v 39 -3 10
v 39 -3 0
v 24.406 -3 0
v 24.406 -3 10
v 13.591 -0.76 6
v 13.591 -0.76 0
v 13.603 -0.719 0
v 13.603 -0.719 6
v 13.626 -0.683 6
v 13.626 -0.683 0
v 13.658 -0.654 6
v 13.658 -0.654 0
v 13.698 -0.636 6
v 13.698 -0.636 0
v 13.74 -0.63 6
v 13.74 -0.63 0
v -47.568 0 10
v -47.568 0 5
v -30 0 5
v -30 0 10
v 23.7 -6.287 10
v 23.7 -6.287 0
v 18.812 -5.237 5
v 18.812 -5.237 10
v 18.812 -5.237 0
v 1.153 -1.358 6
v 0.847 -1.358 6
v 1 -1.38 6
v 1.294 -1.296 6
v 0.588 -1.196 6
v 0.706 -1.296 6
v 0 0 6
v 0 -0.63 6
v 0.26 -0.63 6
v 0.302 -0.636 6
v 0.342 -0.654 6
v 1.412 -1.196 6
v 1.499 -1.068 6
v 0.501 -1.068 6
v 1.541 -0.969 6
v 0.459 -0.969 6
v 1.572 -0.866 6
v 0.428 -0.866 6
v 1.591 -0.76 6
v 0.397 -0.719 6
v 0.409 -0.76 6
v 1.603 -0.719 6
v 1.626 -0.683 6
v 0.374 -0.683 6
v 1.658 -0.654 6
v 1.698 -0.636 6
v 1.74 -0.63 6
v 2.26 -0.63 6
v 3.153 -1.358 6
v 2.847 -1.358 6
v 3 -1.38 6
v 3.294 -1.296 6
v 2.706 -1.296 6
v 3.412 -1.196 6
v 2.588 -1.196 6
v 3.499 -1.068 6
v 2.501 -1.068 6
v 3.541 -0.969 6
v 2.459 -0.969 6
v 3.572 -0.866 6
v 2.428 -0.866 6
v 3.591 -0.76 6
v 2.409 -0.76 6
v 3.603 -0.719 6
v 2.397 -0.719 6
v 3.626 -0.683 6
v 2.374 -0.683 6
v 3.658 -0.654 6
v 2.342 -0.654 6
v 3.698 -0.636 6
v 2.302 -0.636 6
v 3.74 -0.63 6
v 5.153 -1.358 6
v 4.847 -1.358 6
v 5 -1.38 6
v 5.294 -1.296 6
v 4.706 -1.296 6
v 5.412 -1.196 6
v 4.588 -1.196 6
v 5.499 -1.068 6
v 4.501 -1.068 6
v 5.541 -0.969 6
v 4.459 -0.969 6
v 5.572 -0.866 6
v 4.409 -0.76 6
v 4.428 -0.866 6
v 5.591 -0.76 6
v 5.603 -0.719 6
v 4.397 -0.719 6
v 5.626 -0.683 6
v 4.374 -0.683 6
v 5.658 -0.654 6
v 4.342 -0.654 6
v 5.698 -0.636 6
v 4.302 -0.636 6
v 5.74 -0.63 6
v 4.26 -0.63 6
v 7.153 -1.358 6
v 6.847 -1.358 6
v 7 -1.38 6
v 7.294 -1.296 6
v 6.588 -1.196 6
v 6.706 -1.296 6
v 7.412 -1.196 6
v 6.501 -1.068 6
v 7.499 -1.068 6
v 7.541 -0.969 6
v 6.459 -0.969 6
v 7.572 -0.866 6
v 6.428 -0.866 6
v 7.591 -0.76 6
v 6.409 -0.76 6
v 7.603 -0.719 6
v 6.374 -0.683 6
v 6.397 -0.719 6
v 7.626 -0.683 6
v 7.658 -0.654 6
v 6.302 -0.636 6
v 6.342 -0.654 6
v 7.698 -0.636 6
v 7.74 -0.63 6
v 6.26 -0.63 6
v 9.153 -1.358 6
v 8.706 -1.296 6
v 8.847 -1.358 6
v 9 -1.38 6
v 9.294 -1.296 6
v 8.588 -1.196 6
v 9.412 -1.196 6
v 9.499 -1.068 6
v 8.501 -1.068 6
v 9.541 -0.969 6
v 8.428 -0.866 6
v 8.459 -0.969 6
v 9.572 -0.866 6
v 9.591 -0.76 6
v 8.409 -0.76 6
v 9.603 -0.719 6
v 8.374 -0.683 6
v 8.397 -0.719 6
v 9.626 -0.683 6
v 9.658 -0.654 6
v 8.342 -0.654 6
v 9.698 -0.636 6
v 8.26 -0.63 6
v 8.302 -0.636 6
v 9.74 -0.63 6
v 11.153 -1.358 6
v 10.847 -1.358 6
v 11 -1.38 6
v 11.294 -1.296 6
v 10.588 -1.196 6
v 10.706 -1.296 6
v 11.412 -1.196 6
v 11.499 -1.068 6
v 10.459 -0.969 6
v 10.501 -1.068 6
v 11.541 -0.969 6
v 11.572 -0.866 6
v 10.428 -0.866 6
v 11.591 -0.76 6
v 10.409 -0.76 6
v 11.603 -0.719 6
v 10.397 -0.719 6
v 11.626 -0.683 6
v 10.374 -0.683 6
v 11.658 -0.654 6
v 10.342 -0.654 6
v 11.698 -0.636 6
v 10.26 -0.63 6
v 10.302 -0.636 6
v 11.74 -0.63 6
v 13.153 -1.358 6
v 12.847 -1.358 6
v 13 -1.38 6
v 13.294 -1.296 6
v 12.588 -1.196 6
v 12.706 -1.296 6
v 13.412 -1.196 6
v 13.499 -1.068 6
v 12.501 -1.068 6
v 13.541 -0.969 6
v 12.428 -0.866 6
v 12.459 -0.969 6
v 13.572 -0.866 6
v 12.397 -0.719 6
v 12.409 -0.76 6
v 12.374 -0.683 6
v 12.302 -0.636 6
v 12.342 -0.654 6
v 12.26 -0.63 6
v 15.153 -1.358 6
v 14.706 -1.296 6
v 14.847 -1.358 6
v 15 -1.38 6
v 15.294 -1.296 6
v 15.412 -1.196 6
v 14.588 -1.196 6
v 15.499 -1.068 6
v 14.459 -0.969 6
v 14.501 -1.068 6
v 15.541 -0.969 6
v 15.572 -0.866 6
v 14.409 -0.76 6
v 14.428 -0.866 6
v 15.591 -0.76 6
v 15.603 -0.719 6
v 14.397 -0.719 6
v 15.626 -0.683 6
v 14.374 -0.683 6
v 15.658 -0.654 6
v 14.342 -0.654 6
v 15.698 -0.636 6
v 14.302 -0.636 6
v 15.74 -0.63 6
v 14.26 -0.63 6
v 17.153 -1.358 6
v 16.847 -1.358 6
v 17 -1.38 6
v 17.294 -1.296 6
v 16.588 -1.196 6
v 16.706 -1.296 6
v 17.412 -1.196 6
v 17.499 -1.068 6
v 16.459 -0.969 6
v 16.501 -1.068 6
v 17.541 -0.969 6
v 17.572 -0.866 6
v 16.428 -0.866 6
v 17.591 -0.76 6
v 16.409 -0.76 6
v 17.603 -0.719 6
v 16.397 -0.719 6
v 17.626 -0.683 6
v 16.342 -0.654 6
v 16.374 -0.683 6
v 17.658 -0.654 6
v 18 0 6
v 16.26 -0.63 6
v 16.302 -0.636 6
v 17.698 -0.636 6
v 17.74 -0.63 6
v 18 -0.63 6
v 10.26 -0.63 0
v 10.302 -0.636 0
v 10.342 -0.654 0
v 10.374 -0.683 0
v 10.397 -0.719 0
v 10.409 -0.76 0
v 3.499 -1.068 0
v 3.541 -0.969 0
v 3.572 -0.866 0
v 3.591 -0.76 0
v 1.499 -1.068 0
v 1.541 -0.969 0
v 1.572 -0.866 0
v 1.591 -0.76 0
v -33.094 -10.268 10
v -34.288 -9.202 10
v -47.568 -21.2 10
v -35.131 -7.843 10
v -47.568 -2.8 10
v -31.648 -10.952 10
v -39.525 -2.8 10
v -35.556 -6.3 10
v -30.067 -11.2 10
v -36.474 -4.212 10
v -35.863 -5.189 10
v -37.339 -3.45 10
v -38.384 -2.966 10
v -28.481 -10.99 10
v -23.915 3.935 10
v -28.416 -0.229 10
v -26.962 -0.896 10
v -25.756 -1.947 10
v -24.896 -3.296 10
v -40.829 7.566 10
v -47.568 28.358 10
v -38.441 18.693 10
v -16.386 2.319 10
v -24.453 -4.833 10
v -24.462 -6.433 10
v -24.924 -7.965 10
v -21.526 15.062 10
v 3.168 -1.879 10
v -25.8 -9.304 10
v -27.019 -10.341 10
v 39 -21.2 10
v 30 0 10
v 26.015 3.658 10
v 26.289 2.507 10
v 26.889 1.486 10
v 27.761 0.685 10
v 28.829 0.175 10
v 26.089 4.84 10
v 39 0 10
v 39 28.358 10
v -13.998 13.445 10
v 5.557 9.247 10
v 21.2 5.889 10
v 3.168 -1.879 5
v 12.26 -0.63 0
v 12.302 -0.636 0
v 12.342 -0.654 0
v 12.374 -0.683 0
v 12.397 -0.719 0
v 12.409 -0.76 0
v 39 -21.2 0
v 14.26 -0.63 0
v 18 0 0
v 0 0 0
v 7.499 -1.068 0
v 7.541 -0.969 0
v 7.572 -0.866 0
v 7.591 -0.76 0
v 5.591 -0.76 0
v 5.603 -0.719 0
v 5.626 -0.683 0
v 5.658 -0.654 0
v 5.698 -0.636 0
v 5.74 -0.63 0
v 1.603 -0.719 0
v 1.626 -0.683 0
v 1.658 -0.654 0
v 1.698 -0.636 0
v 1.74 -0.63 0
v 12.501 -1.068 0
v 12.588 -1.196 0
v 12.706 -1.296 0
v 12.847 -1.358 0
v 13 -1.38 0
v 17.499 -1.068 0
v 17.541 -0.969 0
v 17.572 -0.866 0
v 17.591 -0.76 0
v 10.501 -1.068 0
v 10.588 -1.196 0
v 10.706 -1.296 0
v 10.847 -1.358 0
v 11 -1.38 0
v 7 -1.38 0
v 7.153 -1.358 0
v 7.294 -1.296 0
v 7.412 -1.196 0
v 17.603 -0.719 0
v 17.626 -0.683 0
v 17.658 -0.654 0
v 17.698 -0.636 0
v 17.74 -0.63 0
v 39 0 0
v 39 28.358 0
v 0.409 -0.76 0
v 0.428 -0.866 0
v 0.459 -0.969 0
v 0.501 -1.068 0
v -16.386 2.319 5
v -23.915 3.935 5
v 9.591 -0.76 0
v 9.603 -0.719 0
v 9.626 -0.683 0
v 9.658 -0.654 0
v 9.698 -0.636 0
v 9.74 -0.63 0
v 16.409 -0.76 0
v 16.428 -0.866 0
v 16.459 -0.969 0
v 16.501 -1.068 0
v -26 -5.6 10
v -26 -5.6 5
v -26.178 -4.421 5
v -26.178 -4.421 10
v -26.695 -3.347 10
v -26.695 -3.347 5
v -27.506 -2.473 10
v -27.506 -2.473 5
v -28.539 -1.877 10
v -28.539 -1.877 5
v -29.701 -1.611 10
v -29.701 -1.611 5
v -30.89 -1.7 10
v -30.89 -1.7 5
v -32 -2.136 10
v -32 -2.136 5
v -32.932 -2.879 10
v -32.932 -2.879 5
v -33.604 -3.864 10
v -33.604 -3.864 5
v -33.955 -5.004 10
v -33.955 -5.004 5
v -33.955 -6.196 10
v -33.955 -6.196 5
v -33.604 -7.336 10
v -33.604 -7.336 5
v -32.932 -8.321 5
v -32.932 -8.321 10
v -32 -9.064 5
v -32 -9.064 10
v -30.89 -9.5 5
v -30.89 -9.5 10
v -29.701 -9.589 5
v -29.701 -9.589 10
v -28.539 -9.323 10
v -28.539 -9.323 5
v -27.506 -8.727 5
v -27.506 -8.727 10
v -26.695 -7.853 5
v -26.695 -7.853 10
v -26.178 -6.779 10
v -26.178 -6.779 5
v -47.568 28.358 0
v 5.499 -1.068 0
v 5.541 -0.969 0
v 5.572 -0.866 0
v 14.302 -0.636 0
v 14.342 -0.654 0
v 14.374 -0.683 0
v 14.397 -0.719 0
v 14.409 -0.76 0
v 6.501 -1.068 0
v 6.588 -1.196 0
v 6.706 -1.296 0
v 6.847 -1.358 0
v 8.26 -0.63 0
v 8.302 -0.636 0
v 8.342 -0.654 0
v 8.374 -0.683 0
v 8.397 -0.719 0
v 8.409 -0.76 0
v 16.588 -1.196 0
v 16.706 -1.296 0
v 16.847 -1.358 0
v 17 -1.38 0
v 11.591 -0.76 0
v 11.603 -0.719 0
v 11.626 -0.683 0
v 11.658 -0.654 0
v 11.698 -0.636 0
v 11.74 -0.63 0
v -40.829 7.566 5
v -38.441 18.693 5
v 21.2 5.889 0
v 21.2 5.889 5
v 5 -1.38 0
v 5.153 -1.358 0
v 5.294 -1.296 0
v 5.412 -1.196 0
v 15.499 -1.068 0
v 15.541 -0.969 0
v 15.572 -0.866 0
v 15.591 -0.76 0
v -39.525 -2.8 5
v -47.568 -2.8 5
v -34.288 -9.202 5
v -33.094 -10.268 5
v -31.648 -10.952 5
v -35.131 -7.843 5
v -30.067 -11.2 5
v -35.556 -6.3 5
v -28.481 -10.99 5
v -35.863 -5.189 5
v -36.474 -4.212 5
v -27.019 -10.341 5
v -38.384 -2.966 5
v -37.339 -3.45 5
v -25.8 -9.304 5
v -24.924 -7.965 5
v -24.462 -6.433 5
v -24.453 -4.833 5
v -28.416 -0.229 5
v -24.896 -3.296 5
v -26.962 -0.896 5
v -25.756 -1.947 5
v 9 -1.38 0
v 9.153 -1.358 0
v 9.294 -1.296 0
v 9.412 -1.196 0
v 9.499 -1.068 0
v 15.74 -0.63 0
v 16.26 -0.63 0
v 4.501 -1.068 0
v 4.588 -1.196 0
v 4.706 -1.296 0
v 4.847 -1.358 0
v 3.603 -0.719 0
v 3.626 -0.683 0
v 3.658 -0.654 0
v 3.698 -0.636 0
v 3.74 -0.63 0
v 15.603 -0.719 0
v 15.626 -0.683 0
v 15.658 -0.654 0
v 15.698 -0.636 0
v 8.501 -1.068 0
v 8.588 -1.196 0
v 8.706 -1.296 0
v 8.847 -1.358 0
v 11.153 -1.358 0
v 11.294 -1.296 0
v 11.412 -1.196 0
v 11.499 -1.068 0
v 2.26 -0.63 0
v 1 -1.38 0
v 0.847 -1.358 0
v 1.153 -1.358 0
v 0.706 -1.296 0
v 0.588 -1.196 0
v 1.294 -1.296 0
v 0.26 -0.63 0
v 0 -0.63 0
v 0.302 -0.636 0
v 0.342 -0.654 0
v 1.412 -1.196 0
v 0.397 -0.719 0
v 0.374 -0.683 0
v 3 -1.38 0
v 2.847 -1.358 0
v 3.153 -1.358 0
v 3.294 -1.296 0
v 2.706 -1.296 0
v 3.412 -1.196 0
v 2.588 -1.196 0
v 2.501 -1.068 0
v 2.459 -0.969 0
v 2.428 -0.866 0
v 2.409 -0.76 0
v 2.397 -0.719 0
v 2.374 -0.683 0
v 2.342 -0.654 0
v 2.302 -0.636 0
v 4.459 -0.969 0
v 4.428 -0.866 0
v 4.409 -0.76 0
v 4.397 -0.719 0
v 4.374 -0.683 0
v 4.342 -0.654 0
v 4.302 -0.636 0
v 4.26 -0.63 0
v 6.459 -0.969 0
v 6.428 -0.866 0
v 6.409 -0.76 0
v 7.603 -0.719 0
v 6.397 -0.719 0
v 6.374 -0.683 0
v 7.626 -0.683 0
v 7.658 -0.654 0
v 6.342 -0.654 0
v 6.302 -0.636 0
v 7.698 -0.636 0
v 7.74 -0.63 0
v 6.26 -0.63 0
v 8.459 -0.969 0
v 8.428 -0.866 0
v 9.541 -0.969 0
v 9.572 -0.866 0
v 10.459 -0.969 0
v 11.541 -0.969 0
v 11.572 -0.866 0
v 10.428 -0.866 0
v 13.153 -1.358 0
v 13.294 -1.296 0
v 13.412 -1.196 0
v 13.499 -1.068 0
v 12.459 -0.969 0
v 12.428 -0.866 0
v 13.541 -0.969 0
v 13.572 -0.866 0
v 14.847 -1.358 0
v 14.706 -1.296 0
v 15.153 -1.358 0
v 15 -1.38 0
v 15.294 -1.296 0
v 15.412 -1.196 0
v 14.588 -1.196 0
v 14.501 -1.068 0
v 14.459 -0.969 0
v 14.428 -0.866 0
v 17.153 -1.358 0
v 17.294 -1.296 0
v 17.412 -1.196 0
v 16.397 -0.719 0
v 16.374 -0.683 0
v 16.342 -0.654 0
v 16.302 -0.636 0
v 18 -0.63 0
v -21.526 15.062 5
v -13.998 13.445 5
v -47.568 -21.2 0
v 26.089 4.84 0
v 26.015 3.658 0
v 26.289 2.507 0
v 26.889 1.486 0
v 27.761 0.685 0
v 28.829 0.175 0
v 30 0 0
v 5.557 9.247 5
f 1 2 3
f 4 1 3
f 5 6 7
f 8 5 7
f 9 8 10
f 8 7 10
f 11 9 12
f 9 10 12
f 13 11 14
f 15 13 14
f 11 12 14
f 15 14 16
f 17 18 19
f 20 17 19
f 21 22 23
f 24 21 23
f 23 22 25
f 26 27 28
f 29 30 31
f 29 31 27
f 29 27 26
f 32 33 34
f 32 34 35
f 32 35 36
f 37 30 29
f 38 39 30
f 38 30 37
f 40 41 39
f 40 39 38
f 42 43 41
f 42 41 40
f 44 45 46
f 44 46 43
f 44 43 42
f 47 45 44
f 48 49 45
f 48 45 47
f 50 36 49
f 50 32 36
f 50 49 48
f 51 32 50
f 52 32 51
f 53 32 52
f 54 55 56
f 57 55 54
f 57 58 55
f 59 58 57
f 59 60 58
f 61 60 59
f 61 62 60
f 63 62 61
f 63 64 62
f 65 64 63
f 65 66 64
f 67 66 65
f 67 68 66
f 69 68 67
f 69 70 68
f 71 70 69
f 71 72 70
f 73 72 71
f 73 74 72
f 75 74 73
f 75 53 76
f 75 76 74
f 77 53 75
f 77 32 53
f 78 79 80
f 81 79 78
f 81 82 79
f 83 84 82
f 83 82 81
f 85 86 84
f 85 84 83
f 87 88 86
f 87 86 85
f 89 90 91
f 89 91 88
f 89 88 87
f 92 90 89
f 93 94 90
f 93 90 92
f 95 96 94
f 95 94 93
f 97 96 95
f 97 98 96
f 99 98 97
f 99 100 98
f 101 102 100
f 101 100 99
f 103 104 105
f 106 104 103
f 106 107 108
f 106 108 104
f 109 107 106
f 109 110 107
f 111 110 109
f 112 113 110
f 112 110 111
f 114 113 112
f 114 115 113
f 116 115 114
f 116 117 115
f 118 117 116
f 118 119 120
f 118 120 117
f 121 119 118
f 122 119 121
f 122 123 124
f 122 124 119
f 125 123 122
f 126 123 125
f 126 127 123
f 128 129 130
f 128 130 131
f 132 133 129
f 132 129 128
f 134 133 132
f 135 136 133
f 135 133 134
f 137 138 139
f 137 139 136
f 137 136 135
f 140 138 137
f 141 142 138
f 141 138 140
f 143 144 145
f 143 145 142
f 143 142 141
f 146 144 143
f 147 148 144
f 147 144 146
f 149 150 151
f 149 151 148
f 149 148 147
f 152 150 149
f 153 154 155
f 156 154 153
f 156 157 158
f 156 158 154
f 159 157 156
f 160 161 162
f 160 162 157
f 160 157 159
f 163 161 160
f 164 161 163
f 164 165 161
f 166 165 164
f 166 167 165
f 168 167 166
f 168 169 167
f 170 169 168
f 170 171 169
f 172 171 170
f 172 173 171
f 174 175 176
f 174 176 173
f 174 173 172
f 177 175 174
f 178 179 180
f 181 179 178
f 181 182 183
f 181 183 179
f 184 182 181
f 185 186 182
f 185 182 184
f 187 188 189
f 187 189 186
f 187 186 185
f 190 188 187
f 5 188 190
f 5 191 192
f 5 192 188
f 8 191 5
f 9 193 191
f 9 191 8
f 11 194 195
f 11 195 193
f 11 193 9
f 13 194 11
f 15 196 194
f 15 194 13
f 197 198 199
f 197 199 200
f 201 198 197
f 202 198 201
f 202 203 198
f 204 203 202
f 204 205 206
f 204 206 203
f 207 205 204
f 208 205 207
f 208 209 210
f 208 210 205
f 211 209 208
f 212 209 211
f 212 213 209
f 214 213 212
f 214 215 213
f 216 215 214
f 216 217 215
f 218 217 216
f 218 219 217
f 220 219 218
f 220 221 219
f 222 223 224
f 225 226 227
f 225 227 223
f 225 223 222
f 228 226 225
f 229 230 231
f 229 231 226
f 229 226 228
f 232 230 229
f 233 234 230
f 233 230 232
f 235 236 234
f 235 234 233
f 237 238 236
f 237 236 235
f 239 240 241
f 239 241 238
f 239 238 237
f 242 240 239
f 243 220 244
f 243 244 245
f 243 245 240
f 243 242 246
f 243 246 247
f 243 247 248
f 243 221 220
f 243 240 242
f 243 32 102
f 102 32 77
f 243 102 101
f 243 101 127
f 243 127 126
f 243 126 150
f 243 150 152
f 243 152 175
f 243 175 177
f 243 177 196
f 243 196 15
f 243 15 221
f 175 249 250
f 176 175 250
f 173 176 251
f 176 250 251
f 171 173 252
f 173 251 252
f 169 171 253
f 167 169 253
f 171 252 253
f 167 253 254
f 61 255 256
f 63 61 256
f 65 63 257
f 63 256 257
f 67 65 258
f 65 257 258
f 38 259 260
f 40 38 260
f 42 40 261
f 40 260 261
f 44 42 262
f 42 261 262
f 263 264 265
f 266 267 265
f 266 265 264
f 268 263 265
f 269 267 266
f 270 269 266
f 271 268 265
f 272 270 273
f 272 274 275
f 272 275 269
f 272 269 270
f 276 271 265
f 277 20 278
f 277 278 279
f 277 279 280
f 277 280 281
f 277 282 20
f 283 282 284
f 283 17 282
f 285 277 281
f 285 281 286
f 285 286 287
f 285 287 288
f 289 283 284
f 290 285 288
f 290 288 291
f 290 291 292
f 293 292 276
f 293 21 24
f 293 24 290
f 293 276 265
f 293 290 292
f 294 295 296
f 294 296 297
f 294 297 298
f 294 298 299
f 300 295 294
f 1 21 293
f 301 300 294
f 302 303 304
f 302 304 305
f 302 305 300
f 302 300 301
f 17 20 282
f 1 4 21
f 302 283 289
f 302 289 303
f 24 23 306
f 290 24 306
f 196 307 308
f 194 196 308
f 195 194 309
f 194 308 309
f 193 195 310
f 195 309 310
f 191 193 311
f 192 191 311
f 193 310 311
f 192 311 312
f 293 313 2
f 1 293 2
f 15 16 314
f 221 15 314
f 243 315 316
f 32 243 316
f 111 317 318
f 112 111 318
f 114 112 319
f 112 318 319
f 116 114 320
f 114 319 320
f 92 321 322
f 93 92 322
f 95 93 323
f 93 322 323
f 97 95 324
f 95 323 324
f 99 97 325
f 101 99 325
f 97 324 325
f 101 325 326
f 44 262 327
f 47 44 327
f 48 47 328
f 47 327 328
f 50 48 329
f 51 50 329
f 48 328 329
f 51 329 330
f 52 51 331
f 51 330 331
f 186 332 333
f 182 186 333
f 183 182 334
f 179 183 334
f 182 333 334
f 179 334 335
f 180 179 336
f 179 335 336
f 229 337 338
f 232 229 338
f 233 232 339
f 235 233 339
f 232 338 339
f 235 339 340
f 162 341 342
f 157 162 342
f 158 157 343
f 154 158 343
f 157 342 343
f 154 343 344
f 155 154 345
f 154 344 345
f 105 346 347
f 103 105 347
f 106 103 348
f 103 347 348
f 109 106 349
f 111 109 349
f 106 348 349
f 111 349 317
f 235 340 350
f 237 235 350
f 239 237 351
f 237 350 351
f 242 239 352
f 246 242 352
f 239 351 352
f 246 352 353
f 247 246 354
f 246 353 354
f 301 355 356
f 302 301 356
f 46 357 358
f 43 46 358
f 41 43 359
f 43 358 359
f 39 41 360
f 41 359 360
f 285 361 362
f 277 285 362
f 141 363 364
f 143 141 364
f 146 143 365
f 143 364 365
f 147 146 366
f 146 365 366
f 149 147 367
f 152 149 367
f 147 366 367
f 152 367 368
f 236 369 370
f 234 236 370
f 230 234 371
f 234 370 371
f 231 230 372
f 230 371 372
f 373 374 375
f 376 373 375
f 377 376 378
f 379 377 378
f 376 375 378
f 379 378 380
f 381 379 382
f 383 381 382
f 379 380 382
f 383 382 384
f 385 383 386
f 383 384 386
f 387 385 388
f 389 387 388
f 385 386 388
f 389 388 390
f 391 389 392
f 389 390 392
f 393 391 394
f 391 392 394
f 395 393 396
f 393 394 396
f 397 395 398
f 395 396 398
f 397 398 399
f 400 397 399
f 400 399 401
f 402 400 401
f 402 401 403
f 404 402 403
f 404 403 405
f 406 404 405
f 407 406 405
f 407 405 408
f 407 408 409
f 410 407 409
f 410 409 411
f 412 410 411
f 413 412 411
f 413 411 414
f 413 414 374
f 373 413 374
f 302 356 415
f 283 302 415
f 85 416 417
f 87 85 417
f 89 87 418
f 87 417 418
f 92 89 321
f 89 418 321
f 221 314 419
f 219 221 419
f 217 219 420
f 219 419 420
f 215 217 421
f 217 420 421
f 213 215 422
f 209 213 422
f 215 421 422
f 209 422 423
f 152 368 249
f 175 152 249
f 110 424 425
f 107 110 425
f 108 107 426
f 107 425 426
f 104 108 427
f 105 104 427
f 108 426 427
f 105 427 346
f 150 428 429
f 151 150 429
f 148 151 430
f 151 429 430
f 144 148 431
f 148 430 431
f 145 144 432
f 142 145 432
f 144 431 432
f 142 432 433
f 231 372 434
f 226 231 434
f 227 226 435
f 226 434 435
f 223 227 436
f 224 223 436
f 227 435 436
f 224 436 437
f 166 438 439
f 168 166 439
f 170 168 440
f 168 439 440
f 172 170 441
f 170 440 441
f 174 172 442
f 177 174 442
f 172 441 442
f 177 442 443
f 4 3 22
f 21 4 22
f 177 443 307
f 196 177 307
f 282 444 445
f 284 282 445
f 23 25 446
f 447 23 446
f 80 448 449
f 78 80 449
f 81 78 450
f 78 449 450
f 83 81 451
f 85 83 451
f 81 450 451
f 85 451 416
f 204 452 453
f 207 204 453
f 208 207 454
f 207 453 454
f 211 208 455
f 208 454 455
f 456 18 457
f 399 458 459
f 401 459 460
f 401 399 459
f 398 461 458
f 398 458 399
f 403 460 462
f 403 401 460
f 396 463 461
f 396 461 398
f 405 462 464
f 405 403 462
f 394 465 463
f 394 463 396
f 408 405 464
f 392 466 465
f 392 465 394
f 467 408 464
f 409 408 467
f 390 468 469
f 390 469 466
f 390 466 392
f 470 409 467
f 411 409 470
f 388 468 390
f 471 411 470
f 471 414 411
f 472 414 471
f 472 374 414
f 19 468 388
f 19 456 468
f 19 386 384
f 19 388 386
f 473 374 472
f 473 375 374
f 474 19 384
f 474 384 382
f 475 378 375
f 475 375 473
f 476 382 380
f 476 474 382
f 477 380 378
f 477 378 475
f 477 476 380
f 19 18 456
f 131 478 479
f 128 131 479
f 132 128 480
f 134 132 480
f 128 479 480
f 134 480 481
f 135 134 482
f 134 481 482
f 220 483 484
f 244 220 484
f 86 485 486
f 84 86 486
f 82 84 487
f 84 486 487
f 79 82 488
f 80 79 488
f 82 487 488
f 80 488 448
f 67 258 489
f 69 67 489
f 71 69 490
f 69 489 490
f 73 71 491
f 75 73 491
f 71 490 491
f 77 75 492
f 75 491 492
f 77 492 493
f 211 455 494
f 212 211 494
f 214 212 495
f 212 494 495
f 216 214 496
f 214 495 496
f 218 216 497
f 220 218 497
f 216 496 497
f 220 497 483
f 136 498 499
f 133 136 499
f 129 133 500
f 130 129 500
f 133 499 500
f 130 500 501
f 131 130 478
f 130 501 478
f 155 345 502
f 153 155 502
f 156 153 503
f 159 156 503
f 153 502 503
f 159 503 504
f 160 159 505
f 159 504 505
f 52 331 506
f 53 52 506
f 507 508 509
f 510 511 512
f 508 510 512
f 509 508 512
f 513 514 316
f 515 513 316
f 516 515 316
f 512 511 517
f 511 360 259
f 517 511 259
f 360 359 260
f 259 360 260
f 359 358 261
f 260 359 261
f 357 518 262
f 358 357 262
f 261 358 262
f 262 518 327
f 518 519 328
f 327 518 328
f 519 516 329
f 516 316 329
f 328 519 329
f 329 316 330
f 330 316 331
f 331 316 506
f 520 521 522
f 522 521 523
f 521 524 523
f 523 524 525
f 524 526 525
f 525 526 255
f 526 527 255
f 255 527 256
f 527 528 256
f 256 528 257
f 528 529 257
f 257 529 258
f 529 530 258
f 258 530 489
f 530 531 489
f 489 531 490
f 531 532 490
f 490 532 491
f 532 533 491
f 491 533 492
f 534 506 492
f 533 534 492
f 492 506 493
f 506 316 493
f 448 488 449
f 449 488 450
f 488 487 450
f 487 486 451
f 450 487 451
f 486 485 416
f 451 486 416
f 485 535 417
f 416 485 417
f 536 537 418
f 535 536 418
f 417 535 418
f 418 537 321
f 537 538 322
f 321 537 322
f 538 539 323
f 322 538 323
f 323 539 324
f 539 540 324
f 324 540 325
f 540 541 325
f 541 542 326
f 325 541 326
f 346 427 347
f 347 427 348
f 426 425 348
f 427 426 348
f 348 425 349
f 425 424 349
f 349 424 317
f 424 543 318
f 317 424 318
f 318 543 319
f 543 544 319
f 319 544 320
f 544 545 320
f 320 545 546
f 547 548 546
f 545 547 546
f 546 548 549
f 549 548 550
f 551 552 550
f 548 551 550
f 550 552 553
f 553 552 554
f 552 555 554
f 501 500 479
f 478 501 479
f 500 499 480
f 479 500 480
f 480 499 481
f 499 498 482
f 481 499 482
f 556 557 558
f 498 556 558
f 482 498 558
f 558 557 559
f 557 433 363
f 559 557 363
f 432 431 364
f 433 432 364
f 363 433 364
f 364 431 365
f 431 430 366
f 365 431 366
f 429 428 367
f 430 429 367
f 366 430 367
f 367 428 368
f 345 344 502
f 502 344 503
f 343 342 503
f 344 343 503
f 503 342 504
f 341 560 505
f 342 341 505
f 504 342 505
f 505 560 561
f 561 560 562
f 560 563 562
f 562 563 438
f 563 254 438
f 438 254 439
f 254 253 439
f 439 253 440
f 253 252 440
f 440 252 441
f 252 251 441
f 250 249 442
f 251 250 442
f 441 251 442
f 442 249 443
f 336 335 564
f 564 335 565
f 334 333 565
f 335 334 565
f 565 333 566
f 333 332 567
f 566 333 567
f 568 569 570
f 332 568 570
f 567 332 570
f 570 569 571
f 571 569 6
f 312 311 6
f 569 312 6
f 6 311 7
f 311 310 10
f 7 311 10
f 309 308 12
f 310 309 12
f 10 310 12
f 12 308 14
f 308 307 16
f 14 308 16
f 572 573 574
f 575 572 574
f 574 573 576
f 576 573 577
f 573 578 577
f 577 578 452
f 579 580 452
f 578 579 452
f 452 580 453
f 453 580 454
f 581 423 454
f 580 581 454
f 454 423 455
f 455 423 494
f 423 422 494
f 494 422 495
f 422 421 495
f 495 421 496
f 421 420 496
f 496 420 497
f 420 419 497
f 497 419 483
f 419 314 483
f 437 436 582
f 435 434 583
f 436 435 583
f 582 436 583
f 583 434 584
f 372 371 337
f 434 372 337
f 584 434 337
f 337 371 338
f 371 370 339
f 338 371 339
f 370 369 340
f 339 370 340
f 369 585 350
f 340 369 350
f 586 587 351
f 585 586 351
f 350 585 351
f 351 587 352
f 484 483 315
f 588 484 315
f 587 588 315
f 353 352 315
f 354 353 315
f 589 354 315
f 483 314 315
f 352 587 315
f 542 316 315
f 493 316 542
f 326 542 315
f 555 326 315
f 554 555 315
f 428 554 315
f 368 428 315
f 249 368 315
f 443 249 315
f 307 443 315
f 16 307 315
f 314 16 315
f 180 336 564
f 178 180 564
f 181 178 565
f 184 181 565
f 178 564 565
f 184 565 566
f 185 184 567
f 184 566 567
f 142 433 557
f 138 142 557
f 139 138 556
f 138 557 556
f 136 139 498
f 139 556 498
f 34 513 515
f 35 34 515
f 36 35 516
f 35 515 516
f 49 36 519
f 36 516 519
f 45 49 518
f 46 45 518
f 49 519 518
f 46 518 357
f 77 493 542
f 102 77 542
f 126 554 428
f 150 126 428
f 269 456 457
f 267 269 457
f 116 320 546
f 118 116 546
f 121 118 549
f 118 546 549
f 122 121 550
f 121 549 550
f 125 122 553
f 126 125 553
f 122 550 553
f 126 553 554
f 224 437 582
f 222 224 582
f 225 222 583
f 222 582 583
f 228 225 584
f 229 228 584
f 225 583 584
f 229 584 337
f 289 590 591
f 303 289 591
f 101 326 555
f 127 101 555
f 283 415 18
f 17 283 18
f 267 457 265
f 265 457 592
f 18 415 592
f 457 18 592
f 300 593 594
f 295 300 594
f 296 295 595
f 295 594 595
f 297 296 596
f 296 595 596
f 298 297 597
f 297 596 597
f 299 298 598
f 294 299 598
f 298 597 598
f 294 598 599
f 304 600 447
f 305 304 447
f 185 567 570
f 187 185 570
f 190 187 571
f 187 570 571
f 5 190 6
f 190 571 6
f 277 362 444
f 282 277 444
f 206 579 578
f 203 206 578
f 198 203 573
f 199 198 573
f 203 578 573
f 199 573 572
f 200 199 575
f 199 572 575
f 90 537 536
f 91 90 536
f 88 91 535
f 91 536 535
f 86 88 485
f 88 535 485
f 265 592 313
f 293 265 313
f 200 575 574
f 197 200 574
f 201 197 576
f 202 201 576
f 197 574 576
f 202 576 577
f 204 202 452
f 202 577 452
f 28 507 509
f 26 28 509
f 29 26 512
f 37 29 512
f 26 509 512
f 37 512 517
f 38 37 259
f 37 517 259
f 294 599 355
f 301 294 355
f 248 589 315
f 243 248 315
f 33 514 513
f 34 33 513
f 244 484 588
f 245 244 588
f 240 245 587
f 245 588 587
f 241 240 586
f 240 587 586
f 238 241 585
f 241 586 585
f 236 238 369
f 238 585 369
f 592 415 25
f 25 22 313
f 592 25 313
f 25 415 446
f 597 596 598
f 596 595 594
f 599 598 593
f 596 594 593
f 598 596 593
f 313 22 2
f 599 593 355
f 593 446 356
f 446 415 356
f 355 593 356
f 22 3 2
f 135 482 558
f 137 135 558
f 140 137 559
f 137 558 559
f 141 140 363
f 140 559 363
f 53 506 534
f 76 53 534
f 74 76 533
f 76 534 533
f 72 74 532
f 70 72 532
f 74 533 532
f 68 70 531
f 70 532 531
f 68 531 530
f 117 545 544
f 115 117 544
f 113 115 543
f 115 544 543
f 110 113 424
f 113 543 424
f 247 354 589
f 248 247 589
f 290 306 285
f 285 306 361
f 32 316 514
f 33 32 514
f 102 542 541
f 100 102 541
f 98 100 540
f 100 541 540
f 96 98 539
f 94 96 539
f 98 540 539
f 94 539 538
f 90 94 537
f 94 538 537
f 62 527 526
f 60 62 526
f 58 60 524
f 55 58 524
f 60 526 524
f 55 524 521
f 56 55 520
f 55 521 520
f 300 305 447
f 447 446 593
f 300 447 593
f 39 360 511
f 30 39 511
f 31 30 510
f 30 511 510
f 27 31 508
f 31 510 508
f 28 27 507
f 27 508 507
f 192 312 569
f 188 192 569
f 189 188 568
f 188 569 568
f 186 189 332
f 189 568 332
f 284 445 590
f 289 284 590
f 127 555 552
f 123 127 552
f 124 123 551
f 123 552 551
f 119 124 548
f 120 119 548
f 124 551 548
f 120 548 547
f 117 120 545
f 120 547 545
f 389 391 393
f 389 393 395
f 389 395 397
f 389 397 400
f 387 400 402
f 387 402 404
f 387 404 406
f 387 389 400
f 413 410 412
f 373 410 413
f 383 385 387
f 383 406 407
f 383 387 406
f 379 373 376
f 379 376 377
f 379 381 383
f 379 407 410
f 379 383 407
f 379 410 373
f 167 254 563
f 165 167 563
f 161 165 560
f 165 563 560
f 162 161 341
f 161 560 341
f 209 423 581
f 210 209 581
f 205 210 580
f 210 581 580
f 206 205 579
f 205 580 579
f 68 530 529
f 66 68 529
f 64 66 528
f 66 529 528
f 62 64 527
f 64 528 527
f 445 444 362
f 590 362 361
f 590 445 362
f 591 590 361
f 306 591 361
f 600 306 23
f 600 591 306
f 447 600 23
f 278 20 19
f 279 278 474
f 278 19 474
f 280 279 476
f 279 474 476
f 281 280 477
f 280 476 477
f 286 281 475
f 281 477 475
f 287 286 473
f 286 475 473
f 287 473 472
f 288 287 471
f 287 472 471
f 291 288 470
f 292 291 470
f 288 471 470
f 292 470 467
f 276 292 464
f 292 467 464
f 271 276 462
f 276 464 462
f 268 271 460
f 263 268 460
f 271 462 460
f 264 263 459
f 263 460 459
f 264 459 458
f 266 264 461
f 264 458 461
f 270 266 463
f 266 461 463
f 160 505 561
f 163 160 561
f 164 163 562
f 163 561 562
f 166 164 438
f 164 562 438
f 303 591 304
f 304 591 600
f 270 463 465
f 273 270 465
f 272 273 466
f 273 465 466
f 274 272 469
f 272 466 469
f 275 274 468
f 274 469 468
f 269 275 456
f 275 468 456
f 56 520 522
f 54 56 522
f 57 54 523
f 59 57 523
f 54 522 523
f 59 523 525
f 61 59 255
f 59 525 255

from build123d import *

# Parameters (mm, degrees)
F0_R     = 4
F1_DEPTH = 10
F2_DEPTH = 5
F4_DEPTH = 6


with BuildPart() as f1:
    # F0 (on Top) → F1 (new body)
    with BuildSketch(Plane.XY):
        with BuildLine():
            Line((-47.567533, 0), (-30, 0))
            ThreePointArc((-30, 0), (-25.8, -9.304052), (-35.556078, -6.3))
            ThreePointArc((-35.556078, -6.3), (-36.878953, -3.8), (-39.524705, -2.8))
            Line((-39.524705, -2.8), (-47.567533, -2.8))
            Line((-47.567533, -2.8), (-47.567533, -21.2))
            Line((-47.567533, -21.2), (39, -21.2))
            Line((39, -21.2), (39, -3))
            Line((39, -3), (24.406104, -3))
            Line((24.406104, -3), (23.700472, -6.286902))
            Line((23.700472, -6.286902), (18.811855, -5.237414))
            Line((18.811855, -5.237414), (3.168281, -1.879052))
            Line((3.168281, -1.879052), (-16.386187, 2.3189))
            Line((-16.386187, 2.3189), (-23.914657, 3.935111))
            Line((-23.914657, 3.935111), (-40.829271, 7.566339))
            Line((-40.829271, 7.566339), (-38.440636, 18.692832))
            Line((-38.440636, 18.692832), (-21.526022, 15.061603))
            Line((-21.526022, 15.061603), (-13.997552, 13.445392))
            Line((-13.997552, 13.445392), (5.556916, 9.24744))
            Line((5.556916, 9.24744), (21.20049, 5.889078))
            Line((21.20049, 5.889078), (26.089106, 4.83959))
            ThreePointArc((26.089106, 4.83959), (30.422153, 7.977661), (34, 4))
            ThreePointArc((34, 4), (32.828427, 1.171573), (30, 0))
            Line((30, 0), (39, 0))
            Line((39, 0), (39, 28.358147))
            Line((39, 28.358147), (-41.479608, 28.358147))
            Line((-41.479608, 28.358147), (-47.567533, 0))
        make_face()
        with BuildLine():
            ThreePointArc((26.089106, 4.83959), (26.888862, 1.485876), (30, 0))
            ThreePointArc((30, 0), (32.828427, 1.171573), (34, 4))
            ThreePointArc((34, 4), (30.422153, 7.977661), (26.089106, 4.83959))
        make_face()
        with Locations((-30, -5.6)):
            Circle(F0_R)
        Polygon((-47.567533, 28.358147), (-47.567533, 0), (-41.479608, 28.358147), align=None)
    extrude(amount=F1_DEPTH)

    # F0 (on Top) → F2 (join)
    with BuildSketch(Plane.XY):
        with BuildLine():
            ThreePointArc((-35.556078, -6.3), (-25.8, -9.304052), (-30, 0))
            Line((-30, 0), (-47.567533, 0))
            Line((-47.567533, 0), (-47.567533, -2.8))
            Line((-47.567533, -2.8), (-39.524705, -2.8))
            ThreePointArc((-39.524705, -2.8), (-36.878953, -3.8), (-35.556078, -6.3))
        make_face()
        with Locations((-30, -5.6)):
            Circle(F0_R, mode=Mode.SUBTRACT)
        Polygon((-23.914657, 3.935111), (-21.526022, 15.061603), (-38.440636, 18.692832), (-40.829271, 7.566339), align=None)
        Polygon((18.811855, -5.237414), (21.20049, 5.889078), (5.556916, 9.24744), (-13.997552, 13.445392), (-21.526022, 15.061603), (-23.914657, 3.935111), (-16.386187, 2.3189), (3.168281, -1.879052), align=None)
        Polygon((-17.20203, 11.382039), (-14.562176, 10.815316), (-15.821562, 4.948976), (-18.461415, 5.515699), align=None, mode=Mode.SUBTRACT)
        Polygon((-15.821562, 4.948976), (-14.562176, 10.815316), (-17.20203, 11.382039), (-18.461415, 5.515699), align=None)
    extrude(amount=F2_DEPTH)


with BuildPart() as f4:
    # F3 (on Top) → F4 (new body)
    with BuildSketch(Plane.XY):
        with BuildLine():
            Line((1, 0), (0, 0))
            Line((0, 0), (0, -0.63))
            Line((0, -0.63), (0.259825, -0.63))
            ThreePointArc((0.259825, -0.63), (0.358732, -0.667229), (0.408543, -0.760435))
            ThreePointArc((0.408543, -0.760435), (0.442388, -0.918062), (0.501124, -1.068202))
            ThreePointArc((0.501124, -1.068202), (0.705851, -1.295639), (1, -1.38))
            ThreePointArc((1, -1.38), (1.294149, -1.295639), (1.498876, -1.068202))
            ThreePointArc((1.498876, -1.068202), (1.557612, -0.918062), (1.591457, -0.760435))
            ThreePointArc((1.591457, -0.760435), (1.641268, -0.667229), (1.740175, -0.63))
            Line((1.740175, -0.63), (2, -0.63))
            Line((2, -0.63), (2.259825, -0.63))
            ThreePointArc((2.259825, -0.63), (2.358732, -0.667229), (2.408543, -0.760435))
            ThreePointArc((2.408543, -0.760435), (2.442388, -0.918062), (2.501124, -1.068202))
            ThreePointArc((2.501124, -1.068202), (2.705851, -1.295639), (3, -1.38))
            ThreePointArc((3, -1.38), (3.294149, -1.295639), (3.498876, -1.068202))
            ThreePointArc((3.498876, -1.068202), (3.557612, -0.918062), (3.591457, -0.760435))
            ThreePointArc((3.591457, -0.760435), (3.641268, -0.667229), (3.740175, -0.63))
            Line((3.740175, -0.63), (4, -0.63))
            Line((4, -0.63), (4.259825, -0.63))
            ThreePointArc((4.259825, -0.63), (4.358732, -0.667229), (4.408543, -0.760435))
            ThreePointArc((4.408543, -0.760435), (4.442388, -0.918062), (4.501124, -1.068202))
            ThreePointArc((4.501124, -1.068202), (4.705851, -1.295639), (5, -1.38))
            ThreePointArc((5, -1.38), (5.294149, -1.295639), (5.498876, -1.068202))
            ThreePointArc((5.498876, -1.068202), (5.557612, -0.918062), (5.591457, -0.760435))
            ThreePointArc((5.591457, -0.760435), (5.641268, -0.667229), (5.740175, -0.63))
            Line((5.740175, -0.63), (6, -0.63))
            Line((6, -0.63), (6.259825, -0.63))
            ThreePointArc((6.259825, -0.63), (6.358732, -0.667229), (6.408543, -0.760435))
            ThreePointArc((6.408543, -0.760435), (6.442388, -0.918062), (6.501124, -1.068202))
            ThreePointArc((6.501124, -1.068202), (6.705851, -1.295639), (7, -1.38))
            ThreePointArc((7, -1.38), (7.294149, -1.295639), (7.498876, -1.068202))
            ThreePointArc((7.498876, -1.068202), (7.557612, -0.918062), (7.591457, -0.760435))
            ThreePointArc((7.591457, -0.760435), (7.641268, -0.667229), (7.740175, -0.63))
            Line((7.740175, -0.63), (8, -0.63))
            Line((8, -0.63), (8.259825, -0.63))
            ThreePointArc((8.259825, -0.63), (8.358732, -0.667229), (8.408543, -0.760435))
            ThreePointArc((8.408543, -0.760435), (8.442388, -0.918062), (8.501124, -1.068202))
            ThreePointArc((8.501124, -1.068202), (8.705851, -1.295639), (9, -1.38))
            ThreePointArc((9, -1.38), (9.294149, -1.295639), (9.498876, -1.068202))
            ThreePointArc((9.498876, -1.068202), (9.557612, -0.918062), (9.591457, -0.760435))
            ThreePointArc((9.591457, -0.760435), (9.641268, -0.667229), (9.740175, -0.63))
            Line((9.740175, -0.63), (10, -0.63))
            Line((10, -0.63), (10.259825, -0.63))
            ThreePointArc((10.259825, -0.63), (10.358732, -0.667229), (10.408543, -0.760435))
            ThreePointArc((10.408543, -0.760435), (10.442388, -0.918062), (10.501124, -1.068202))
            ThreePointArc((10.501124, -1.068202), (10.705851, -1.295639), (11, -1.38))
            ThreePointArc((11, -1.38), (11.294149, -1.295639), (11.498876, -1.068202))
            ThreePointArc((11.498876, -1.068202), (11.557612, -0.918062), (11.591457, -0.760435))
            ThreePointArc((11.591457, -0.760435), (11.641268, -0.667229), (11.740175, -0.63))
            Line((11.740175, -0.63), (12, -0.63))
            Line((12, -0.63), (12.259825, -0.63))
            ThreePointArc((12.259825, -0.63), (12.358732, -0.667229), (12.408543, -0.760435))
            ThreePointArc((12.408543, -0.760435), (12.442388, -0.918062), (12.501124, -1.068202))
            ThreePointArc((12.501124, -1.068202), (12.705851, -1.295639), (13, -1.38))
            ThreePointArc((13, -1.38), (13.294149, -1.295639), (13.498876, -1.068202))
            ThreePointArc((13.498876, -1.068202), (13.557612, -0.918062), (13.591457, -0.760435))
            ThreePointArc((13.591457, -0.760435), (13.641268, -0.667229), (13.740175, -0.63))
            Line((13.740175, -0.63), (14, -0.63))
            Line((14, -0.63), (14.259825, -0.63))
            ThreePointArc((14.259825, -0.63), (14.358732, -0.667229), (14.408543, -0.760435))
            ThreePointArc((14.408543, -0.760435), (14.442388, -0.918062), (14.501124, -1.068202))
            ThreePointArc((14.501124, -1.068202), (14.705851, -1.295639), (15, -1.38))
            ThreePointArc((15, -1.38), (15.294149, -1.295639), (15.498876, -1.068202))
            ThreePointArc((15.498876, -1.068202), (15.557612, -0.918062), (15.591457, -0.760435))
            ThreePointArc((15.591457, -0.760435), (15.641268, -0.667229), (15.740175, -0.63))
            Line((15.740175, -0.63), (16, -0.63))
            Line((16, -0.63), (16.259825, -0.63))
            ThreePointArc((16.259825, -0.63), (16.358732, -0.667229), (16.408543, -0.760435))
            ThreePointArc((16.408543, -0.760435), (16.442388, -0.918062), (16.501124, -1.068202))
            ThreePointArc((16.501124, -1.068202), (16.705851, -1.295639), (17, -1.38))
            ThreePointArc((17, -1.38), (17.294149, -1.295639), (17.498876, -1.068202))
            ThreePointArc((17.498876, -1.068202), (17.557612, -0.918062), (17.591457, -0.760435))
            ThreePointArc((17.591457, -0.760435), (17.641268, -0.667229), (17.740175, -0.63))
            Line((17.740175, -0.63), (18, -0.63))
            Line((18, -0.63), (18, 0))
            Line((18, 0), (17, 0))
            Line((17, 0), (15, 0))
            Line((15, 0), (13, 0))
            Line((13, 0), (11, 0))
            Line((11, 0), (9, 0))
            Line((9, 0), (7, 0))
            Line((7, 0), (5, 0))
            Line((5, 0), (3, 0))
            Line((3, 0), (1, 0))
        make_face()
    extrude(amount=F4_DEPTH)


solid = Compound([f1.part, f4.part])
